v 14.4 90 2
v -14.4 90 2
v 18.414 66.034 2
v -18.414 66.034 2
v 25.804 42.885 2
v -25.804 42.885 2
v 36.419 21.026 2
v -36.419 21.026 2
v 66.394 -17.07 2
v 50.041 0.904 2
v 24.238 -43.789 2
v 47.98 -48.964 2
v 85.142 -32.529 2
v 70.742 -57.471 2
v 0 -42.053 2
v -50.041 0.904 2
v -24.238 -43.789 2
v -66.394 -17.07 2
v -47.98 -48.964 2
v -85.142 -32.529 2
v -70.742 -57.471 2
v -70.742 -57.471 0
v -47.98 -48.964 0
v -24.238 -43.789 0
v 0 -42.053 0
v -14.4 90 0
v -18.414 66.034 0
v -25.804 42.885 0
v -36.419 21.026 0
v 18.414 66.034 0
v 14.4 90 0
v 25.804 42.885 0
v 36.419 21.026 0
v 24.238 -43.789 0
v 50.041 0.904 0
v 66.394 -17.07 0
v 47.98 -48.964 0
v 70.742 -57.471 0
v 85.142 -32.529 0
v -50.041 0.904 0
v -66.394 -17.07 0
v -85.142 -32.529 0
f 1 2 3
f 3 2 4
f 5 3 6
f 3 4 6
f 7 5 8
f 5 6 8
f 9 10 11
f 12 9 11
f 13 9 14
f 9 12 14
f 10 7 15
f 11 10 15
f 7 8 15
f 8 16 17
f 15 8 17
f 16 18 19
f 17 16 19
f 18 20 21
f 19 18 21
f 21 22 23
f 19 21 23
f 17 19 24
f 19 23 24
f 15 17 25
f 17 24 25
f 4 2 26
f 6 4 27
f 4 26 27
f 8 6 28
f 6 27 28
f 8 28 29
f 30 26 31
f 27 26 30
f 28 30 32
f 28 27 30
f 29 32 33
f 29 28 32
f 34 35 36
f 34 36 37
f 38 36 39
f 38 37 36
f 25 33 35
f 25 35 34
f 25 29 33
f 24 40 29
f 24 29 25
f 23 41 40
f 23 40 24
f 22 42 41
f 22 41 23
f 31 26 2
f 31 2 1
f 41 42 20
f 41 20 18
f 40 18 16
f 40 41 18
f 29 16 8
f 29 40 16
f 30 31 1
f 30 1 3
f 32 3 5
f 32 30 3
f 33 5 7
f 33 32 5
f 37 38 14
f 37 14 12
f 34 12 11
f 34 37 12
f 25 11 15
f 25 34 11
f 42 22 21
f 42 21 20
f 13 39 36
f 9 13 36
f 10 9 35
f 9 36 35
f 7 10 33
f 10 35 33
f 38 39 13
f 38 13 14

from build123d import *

# Parameters (mm, degrees)
PAD002_DEPTH               = 2
PAD002_MIRRORED004_2_DEPTH = 2
POLARPATTERN004_COUNT      = 3


with BuildPart() as part:
    # Sketch012 → Pad002 (new body)
    with BuildSketch(Plane.XY):
        with BuildLine():
            Line((0, 0), (36.418579, 21.026276))
            ThreePointArc((14.4, 90), (21.694701, 54.327325), (36.418579, 21.026276))
            Line((14.4, 90), (0, 90))
            Line((0, 90), (0, 0))
        make_face()
    pad002 = extrude(amount=PAD002_DEPTH)

    # Sketch012 Mirrored004 2 → Pad002 Mirrored004 2 (add)
    with BuildSketch(Plane(origin=(0, 0, 0), x_dir=(-1, 0, 0), z_dir=(0, 0, -1))):
        with BuildLine():
            Line((0, 0), (36.418579, 21.026276))
            ThreePointArc((14.4, 90), (21.694701, 54.327325), (36.418579, 21.026276))
            Line((14.4, 90), (0, 90))
            Line((0, 90), (0, 0))
        make_face()
    pad002_mirrored004_2 = extrude(amount=-PAD002_MIRRORED004_2_DEPTH)

    # PolarPattern004: Pad002, Pad002 Mirrored004 2 ×3 about axis
    polarpattern004_axis = Axis((0, 0, 0), (0, 0, 1))
    for i in range(1, POLARPATTERN004_COUNT):
        add(pad002.rotate(polarpattern004_axis, i * 360 / POLARPATTERN004_COUNT))
        add(pad002_mirrored004_2.rotate(polarpattern004_axis, i * 360 / POLARPATTERN004_COUNT))


solid = part.part
